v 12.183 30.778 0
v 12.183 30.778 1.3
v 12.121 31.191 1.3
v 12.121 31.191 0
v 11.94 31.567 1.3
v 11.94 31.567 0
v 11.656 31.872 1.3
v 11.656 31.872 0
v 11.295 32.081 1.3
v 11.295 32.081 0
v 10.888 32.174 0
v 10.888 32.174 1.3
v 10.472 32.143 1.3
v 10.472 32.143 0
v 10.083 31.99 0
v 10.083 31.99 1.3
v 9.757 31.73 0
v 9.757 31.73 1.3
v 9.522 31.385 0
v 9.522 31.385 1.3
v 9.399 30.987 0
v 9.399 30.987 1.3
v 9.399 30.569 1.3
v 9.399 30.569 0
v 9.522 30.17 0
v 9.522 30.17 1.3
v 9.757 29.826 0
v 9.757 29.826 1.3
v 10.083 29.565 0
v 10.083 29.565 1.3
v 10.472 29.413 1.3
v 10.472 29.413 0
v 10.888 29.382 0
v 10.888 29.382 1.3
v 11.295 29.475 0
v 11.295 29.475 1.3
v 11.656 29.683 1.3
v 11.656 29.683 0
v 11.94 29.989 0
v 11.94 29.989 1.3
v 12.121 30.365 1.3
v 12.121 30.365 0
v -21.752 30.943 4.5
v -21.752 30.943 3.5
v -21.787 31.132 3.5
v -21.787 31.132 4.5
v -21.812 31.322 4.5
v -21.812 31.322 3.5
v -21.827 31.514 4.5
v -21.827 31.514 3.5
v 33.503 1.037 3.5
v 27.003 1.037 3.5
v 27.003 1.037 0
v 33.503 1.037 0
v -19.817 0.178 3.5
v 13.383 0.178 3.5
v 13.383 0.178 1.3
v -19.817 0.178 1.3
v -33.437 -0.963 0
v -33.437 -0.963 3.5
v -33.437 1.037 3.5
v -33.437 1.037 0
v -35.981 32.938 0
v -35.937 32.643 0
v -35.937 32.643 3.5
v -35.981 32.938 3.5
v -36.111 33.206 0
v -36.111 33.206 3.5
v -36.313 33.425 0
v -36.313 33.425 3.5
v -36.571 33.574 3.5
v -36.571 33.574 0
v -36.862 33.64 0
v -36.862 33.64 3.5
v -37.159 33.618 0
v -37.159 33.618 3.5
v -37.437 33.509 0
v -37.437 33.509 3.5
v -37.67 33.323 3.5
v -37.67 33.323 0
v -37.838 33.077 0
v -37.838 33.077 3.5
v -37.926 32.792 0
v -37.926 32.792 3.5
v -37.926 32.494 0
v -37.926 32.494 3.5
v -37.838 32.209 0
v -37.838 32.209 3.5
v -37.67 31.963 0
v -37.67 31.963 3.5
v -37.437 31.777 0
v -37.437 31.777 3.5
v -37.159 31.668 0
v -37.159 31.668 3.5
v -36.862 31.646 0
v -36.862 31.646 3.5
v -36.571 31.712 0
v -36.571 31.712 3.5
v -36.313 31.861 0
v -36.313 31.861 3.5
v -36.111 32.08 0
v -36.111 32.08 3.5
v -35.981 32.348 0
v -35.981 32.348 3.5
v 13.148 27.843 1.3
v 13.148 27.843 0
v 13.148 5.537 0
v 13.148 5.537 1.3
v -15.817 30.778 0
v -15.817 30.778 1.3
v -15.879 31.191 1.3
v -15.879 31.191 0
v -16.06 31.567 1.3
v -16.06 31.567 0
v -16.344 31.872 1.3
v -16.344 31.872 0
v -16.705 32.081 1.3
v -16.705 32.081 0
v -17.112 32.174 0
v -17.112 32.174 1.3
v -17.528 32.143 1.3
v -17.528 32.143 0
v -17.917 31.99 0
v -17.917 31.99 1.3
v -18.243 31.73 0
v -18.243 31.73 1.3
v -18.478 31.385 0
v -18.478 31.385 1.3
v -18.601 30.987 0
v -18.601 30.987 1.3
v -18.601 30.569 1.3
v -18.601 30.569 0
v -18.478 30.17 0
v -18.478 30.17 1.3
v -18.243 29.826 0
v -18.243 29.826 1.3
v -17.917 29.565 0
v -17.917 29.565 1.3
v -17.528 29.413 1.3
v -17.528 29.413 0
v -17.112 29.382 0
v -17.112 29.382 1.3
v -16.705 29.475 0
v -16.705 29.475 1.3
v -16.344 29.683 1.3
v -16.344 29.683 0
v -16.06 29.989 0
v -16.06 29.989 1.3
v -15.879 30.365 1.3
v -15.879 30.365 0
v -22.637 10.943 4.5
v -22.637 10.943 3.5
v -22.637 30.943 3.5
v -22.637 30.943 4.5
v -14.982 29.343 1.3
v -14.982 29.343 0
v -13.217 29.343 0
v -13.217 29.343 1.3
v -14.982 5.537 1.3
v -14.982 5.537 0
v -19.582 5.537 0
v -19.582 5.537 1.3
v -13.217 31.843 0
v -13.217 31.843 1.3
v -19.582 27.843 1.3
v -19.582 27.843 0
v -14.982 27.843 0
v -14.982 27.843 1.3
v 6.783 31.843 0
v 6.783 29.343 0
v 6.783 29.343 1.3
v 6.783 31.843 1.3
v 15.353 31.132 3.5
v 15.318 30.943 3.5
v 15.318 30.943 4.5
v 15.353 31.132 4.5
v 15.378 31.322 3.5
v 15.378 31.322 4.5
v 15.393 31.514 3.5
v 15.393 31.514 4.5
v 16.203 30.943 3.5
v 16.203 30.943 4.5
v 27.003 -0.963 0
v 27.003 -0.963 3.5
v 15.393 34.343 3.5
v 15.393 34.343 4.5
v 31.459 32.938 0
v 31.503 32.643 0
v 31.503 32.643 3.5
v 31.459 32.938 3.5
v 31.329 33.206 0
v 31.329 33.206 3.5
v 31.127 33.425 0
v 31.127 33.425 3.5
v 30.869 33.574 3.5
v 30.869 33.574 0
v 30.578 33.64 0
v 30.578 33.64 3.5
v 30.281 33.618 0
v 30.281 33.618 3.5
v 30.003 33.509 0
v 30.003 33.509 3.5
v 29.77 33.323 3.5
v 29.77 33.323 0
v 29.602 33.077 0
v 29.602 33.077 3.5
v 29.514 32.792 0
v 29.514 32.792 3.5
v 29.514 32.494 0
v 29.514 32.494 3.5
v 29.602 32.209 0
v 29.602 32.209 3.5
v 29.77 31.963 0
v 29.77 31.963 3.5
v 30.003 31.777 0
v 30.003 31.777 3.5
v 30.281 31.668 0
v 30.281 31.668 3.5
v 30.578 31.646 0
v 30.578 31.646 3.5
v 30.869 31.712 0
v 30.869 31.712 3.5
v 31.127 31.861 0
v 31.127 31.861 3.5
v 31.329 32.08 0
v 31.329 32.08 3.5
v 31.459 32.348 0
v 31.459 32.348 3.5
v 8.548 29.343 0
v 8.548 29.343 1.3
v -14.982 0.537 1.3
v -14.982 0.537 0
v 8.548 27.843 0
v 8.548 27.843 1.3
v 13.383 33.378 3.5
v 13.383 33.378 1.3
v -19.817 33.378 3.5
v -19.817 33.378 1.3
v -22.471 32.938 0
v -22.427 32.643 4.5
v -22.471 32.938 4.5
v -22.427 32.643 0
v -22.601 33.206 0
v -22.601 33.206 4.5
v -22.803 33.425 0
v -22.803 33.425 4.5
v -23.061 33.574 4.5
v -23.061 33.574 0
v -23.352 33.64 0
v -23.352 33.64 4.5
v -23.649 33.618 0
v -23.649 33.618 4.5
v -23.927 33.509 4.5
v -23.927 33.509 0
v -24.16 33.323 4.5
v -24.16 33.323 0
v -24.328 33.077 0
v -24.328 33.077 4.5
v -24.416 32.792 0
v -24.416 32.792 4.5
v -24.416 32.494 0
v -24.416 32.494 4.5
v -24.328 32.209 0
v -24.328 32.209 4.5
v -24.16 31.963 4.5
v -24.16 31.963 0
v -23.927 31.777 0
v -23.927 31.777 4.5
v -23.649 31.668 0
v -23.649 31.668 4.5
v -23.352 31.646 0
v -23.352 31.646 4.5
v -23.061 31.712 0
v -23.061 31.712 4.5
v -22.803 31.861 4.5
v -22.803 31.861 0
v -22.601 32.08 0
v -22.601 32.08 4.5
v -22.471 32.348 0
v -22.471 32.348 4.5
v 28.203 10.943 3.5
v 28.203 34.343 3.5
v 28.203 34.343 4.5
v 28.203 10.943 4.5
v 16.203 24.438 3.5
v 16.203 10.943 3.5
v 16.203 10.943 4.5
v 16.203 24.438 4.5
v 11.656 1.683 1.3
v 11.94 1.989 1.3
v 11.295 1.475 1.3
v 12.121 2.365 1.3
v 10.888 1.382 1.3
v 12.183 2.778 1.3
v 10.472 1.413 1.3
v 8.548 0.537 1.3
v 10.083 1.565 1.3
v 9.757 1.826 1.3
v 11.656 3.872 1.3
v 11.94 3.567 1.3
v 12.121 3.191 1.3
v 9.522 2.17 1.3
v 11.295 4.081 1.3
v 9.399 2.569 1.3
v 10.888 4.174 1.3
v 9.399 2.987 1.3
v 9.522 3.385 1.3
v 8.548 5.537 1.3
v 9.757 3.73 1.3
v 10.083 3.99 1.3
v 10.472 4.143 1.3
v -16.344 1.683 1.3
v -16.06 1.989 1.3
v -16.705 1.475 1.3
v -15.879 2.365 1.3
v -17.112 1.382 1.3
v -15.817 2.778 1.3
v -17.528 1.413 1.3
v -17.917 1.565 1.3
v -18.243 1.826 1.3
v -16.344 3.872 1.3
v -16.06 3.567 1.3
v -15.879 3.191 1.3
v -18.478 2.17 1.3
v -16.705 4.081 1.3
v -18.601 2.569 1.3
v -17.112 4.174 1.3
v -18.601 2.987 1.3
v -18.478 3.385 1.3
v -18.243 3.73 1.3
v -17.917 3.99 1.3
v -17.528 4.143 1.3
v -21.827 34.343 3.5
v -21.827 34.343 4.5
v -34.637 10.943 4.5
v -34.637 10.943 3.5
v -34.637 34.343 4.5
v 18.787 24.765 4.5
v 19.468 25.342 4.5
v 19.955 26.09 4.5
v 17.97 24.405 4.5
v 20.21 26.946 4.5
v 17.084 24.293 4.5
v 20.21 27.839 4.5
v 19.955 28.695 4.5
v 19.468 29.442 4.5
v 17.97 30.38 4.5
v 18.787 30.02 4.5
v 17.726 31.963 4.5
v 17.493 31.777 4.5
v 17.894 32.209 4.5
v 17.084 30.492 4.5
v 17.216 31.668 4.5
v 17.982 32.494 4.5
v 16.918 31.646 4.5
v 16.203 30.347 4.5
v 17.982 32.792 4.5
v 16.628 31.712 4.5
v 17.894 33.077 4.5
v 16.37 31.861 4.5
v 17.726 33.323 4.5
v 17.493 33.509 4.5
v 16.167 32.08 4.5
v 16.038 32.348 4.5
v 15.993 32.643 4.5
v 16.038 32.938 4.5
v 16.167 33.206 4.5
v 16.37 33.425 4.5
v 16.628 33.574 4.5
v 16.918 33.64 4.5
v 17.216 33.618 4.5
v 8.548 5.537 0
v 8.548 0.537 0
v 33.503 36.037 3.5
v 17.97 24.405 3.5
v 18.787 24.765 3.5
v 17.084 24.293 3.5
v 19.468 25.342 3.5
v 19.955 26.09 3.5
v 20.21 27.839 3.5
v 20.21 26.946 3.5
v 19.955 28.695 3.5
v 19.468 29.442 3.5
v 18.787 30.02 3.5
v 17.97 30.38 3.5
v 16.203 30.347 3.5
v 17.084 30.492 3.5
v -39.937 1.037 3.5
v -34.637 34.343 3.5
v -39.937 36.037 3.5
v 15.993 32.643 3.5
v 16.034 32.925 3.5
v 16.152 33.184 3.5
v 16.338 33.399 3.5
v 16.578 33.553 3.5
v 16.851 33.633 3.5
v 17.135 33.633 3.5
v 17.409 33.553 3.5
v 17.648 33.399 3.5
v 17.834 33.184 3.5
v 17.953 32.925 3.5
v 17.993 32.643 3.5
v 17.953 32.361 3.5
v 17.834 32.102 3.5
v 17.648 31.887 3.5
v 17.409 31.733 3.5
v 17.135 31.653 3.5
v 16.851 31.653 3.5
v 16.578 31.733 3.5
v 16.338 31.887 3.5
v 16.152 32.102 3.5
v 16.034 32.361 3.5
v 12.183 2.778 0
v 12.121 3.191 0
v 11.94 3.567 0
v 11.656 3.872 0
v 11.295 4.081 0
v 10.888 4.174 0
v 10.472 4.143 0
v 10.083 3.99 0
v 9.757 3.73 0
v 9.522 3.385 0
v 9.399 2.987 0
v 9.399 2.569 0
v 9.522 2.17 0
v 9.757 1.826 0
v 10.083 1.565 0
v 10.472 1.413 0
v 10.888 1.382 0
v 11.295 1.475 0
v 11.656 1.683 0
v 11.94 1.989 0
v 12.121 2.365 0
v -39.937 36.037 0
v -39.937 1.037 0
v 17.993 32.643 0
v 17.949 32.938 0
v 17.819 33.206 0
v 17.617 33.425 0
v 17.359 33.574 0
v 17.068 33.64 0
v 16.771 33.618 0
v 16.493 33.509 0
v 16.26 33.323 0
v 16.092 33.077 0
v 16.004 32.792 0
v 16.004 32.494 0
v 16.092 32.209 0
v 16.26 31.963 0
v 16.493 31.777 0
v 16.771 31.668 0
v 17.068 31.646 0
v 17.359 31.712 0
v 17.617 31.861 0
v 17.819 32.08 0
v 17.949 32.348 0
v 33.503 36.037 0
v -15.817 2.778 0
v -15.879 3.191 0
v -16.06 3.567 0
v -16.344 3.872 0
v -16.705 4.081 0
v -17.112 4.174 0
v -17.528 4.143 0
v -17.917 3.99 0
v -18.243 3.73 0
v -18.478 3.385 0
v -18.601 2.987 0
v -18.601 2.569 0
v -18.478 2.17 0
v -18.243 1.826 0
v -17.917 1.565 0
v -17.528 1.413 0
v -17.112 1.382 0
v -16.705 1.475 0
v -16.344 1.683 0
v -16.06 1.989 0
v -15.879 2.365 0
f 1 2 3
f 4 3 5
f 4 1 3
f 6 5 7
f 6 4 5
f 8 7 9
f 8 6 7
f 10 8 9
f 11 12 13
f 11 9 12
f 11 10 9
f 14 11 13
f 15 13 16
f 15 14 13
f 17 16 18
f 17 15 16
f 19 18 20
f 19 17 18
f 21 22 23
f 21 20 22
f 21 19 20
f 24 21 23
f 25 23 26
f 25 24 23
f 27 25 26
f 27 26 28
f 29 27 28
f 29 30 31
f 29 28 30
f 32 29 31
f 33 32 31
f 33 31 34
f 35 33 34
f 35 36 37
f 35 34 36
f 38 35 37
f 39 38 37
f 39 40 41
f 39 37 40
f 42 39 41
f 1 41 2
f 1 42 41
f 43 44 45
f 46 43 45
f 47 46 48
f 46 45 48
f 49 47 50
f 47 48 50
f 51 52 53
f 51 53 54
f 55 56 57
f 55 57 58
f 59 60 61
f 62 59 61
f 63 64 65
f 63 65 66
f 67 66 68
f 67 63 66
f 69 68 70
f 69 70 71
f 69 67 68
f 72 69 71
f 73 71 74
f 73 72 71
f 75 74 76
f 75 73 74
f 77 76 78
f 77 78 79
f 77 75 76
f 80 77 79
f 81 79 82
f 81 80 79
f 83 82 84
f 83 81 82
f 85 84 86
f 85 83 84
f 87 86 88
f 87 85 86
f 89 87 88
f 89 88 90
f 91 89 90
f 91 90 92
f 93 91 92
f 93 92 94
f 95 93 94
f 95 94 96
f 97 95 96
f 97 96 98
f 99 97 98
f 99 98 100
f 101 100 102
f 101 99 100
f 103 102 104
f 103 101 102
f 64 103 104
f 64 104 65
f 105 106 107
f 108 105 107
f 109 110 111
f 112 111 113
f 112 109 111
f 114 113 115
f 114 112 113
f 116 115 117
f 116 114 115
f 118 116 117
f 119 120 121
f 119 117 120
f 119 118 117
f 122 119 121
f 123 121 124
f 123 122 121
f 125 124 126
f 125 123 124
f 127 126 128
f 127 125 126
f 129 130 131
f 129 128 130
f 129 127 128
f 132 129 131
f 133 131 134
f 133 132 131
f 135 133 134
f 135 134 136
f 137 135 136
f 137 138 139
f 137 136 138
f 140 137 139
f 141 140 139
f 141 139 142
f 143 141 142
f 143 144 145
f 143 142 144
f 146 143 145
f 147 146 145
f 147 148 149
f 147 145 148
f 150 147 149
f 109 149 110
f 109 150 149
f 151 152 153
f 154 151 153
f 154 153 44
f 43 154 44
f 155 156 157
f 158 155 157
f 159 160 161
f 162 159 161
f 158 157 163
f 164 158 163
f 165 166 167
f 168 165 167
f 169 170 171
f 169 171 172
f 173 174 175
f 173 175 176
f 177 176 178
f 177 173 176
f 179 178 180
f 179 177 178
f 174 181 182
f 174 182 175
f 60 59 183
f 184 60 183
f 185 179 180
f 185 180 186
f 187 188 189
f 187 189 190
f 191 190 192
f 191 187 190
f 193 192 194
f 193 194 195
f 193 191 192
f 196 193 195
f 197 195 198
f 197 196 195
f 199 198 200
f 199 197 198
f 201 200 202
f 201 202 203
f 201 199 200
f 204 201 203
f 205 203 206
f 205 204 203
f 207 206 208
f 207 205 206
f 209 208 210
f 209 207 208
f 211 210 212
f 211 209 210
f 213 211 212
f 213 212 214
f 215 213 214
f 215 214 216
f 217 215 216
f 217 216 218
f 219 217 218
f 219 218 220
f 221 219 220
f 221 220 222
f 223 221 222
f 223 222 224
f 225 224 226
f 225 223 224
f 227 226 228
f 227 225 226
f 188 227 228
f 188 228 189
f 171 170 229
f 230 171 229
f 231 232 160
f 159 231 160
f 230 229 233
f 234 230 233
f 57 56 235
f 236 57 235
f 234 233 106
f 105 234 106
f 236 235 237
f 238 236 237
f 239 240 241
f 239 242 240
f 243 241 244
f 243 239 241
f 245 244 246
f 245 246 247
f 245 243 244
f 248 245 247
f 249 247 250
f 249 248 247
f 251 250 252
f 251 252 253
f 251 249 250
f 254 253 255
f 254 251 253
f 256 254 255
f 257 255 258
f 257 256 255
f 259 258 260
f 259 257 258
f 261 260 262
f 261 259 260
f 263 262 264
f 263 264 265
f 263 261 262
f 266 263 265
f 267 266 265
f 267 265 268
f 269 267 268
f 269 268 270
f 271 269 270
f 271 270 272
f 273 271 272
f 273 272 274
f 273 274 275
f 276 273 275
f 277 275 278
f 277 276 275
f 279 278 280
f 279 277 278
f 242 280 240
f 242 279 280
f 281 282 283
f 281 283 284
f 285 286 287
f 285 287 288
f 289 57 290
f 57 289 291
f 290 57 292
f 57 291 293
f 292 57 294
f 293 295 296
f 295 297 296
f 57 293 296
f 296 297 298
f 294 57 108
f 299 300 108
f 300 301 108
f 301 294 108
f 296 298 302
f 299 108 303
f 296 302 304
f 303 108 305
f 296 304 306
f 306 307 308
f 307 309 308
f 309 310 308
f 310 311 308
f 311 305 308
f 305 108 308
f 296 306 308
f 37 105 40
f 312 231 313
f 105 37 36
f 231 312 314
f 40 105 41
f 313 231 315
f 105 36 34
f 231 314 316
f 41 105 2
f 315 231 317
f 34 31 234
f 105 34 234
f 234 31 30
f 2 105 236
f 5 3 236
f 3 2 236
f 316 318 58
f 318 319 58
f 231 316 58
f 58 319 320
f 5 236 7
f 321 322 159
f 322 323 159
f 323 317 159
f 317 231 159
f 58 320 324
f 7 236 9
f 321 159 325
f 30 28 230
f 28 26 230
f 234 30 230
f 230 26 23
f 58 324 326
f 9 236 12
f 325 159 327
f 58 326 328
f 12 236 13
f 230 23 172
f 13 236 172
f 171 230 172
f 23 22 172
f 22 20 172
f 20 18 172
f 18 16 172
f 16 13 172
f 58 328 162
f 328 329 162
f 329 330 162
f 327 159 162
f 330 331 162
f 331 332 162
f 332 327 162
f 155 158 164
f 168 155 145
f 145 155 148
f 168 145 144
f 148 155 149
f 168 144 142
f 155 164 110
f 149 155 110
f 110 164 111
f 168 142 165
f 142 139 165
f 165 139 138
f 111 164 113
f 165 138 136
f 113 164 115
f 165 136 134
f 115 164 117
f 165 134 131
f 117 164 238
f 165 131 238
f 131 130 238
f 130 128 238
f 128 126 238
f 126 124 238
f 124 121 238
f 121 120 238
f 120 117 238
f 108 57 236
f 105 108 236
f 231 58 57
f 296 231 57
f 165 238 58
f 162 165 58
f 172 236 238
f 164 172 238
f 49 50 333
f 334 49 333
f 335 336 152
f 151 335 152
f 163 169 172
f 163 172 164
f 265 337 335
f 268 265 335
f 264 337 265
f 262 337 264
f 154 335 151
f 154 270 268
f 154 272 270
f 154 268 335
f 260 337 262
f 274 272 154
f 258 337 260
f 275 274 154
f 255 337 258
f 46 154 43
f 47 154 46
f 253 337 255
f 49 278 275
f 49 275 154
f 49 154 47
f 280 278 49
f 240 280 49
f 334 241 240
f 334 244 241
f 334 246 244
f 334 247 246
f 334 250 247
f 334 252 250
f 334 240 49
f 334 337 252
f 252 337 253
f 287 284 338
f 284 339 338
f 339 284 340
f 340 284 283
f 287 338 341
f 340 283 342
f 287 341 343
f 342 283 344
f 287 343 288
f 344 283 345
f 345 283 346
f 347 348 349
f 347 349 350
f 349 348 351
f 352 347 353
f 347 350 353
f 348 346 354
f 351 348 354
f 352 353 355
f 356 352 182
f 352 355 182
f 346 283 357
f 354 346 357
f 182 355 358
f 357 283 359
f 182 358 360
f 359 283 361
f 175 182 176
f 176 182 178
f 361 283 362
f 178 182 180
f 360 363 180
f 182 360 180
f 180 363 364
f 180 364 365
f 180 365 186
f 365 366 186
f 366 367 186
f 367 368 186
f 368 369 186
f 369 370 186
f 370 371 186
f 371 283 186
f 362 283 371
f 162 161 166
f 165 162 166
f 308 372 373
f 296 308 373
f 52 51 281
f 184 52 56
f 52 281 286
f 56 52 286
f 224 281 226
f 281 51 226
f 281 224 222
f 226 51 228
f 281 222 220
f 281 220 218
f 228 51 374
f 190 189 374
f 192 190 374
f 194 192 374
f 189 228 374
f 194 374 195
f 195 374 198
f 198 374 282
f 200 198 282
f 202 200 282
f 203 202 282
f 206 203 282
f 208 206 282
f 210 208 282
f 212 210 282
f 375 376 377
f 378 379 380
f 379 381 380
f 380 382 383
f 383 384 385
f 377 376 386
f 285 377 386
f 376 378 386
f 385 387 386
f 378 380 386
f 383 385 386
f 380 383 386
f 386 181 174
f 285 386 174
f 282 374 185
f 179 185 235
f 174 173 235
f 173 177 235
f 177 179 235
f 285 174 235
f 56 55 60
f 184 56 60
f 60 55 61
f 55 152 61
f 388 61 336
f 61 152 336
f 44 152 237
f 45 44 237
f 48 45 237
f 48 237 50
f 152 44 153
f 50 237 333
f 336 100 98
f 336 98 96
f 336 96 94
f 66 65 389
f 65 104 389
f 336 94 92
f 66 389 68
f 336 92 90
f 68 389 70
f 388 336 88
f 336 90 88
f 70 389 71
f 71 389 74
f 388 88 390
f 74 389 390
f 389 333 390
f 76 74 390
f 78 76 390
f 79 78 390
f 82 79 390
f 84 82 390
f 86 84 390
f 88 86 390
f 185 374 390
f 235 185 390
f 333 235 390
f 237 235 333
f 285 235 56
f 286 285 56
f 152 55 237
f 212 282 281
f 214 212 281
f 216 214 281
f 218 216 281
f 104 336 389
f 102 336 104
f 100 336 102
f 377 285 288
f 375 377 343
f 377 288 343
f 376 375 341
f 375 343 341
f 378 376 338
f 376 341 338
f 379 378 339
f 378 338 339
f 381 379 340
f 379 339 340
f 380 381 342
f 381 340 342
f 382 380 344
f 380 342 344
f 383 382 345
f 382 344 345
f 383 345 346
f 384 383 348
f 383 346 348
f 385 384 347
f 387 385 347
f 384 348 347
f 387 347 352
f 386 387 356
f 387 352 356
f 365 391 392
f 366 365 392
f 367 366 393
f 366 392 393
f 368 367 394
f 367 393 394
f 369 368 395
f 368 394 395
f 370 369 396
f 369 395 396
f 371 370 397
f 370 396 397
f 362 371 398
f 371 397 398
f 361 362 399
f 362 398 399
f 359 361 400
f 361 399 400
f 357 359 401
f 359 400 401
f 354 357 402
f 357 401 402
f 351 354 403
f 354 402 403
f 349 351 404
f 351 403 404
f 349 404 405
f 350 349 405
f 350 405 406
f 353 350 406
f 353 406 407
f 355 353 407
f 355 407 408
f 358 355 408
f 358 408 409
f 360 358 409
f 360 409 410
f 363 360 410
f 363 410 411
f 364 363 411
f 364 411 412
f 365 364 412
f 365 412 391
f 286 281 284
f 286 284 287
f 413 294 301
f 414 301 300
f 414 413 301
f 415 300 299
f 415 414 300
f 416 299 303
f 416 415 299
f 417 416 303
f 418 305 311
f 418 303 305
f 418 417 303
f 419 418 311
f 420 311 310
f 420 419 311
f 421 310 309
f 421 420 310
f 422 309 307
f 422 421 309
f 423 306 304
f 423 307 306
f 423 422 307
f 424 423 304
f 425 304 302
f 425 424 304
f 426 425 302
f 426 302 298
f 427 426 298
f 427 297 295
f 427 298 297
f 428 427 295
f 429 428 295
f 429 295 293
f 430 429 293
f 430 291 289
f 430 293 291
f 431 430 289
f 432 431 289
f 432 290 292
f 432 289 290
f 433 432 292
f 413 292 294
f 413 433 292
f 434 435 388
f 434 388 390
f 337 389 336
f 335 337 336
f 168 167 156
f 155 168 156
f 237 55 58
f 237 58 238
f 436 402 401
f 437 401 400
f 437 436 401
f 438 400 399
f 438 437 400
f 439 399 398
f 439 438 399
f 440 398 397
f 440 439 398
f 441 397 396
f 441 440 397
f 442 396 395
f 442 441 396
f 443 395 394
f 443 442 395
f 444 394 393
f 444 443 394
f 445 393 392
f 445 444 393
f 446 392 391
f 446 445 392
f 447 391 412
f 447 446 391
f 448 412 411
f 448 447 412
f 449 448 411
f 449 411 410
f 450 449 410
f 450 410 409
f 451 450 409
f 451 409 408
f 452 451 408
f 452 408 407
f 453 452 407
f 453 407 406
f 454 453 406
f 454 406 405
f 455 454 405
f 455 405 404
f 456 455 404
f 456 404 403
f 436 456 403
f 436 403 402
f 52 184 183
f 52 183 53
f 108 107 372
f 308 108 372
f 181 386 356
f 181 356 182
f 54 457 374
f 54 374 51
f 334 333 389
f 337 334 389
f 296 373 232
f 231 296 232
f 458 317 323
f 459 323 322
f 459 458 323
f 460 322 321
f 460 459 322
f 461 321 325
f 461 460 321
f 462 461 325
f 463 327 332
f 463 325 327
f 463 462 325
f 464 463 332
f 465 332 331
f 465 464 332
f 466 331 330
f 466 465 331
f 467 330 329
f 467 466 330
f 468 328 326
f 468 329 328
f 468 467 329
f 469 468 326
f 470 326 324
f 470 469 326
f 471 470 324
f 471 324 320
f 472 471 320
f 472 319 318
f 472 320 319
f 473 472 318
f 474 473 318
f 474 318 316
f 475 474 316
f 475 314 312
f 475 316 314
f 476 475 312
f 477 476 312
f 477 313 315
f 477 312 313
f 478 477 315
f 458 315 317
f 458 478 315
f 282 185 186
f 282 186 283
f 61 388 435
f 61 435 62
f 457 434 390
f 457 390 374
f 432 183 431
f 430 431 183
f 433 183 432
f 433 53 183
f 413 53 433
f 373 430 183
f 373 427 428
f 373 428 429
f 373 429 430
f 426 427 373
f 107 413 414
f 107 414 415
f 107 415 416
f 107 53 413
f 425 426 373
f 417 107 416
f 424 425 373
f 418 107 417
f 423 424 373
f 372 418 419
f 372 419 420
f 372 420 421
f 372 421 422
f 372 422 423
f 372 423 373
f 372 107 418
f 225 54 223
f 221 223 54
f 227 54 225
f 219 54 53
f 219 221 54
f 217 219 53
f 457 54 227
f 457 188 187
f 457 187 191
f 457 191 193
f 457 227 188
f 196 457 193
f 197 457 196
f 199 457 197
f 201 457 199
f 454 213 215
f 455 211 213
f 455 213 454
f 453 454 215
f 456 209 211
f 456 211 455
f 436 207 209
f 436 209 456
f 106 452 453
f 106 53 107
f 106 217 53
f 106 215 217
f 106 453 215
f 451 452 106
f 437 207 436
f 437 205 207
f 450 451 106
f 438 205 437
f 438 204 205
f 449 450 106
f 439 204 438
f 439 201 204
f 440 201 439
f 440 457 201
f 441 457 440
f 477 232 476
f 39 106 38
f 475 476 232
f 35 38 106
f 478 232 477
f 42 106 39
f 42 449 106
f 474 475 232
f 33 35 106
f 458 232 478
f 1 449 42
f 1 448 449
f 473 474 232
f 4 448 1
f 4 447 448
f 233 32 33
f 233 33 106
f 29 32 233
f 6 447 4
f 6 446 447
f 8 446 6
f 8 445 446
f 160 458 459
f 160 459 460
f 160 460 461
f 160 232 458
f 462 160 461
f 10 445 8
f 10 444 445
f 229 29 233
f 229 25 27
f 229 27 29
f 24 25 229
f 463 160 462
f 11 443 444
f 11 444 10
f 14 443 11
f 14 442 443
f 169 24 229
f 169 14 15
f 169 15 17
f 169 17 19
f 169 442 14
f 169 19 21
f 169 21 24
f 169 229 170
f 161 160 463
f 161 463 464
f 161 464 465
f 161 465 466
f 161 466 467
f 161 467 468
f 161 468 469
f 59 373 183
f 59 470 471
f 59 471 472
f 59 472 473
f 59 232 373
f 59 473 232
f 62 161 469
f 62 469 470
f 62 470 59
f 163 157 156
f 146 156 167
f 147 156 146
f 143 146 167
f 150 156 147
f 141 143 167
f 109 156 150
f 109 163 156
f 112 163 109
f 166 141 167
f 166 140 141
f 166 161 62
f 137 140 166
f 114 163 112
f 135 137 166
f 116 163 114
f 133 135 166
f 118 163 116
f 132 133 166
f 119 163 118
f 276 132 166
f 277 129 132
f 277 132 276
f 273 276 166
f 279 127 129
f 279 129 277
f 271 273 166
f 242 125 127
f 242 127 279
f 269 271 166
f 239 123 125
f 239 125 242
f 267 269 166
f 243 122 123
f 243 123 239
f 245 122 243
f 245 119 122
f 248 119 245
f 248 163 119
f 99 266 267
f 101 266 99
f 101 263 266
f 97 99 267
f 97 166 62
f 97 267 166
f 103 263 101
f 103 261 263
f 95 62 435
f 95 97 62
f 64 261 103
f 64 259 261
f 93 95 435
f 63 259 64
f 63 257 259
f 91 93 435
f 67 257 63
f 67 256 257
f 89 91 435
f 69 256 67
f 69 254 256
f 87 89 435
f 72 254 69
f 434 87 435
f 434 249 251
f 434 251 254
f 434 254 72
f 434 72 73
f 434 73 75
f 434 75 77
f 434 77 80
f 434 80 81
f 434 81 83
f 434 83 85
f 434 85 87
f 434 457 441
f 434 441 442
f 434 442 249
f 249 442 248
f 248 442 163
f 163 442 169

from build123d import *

# Parameters (mm, degrees)
SKETCH3_R           = 1.4
SKETCH3_R_2         = 1
BOSS_EXTRUDE1_DEPTH = 3.5
SKETCH9_W           = 33.2
SKETCH9_H           = 33.2
CUT_EXTRUDE1_DEPTH  = 2.2
SKETCH10_W          = 20
SKETCH10_H          = 2.5
CUT_EXTRUDE2_DEPTH  = 1.75
SKETCH11_R          = 1
BOSS_EXTRUDE2_DEPTH = 1
SKETCH14_R          = 3.1
CUT_EXTRUDE3_DEPTH  = 1
SKETCH15_W          = 6.5
SKETCH15_H          = 2
CUT_EXTRUDE4_DEPTH  = 54.906325173


with BuildPart() as part:
    # Sketch3 → Boss-Extrude1 (new body)
    with BuildSketch(Plane.XY):
        Polygon((-39.936821352, -0.962627815), (-39.936821352, 36.037372185), (33.503178648, 36.037372185), (33.503178648, -0.962627815), (7.298178648, -0.962627815), (-14.831821352, -0.962627815), align=None)
        with Locations((-17.216821352, 30.777902568)):
            Circle(SKETCH3_R, mode=Mode.SUBTRACT)
        with Locations((-36.936821352, 32.642902568)):
            Circle(SKETCH3_R_2, mode=Mode.SUBTRACT)
        with Locations((-23.426821352, 32.642902568)):
            Circle(SKETCH3_R_2, mode=Mode.SUBTRACT)
        with Locations((16.993178648, 32.642902568)):
            Circle(SKETCH3_R_2, mode=Mode.SUBTRACT)
        with Locations((30.503178648, 32.642902568)):
            Circle(SKETCH3_R_2, mode=Mode.SUBTRACT)
        with Locations((-17.216821352, 2.777902568)):
            Circle(SKETCH3_R, mode=Mode.SUBTRACT)
        with Locations((10.783178648, 30.777902568)):
            Circle(SKETCH3_R, mode=Mode.SUBTRACT)
        with Locations((10.783178648, 2.777902568)):
            Circle(SKETCH3_R, mode=Mode.SUBTRACT)
        Polygon((-14.981821352, 0.537372185), (-14.981821352, 5.537372185), (-19.581821352, 5.537372185), (-19.581821352, 27.842902568), (-14.981821352, 27.842902568), (-14.981821352, 29.342902568), (8.548178648, 29.342902568), (8.548178648, 27.842902568), (13.148178648, 27.842902568), (13.148178648, 5.537372185), (8.548178648, 5.537372185), (8.548178648, 0.537372185), align=None, mode=Mode.SUBTRACT)
    extrude(amount=BOSS_EXTRUDE1_DEPTH)

    # Sketch9 → Cut-Extrude1 (cut)
    with BuildSketch(Plane(origin=(0, 0, 3.5), x_dir=(-1, 0, 0), z_dir=(0, 0, -1))):
        with Locations((3.216821352, 16.777902568)):
            Rectangle(SKETCH9_W, SKETCH9_H)
    extrude(amount=CUT_EXTRUDE1_DEPTH, mode=Mode.SUBTRACT)

    # Sketch10 → Cut-Extrude2 (cut)
    with BuildSketch(Plane(origin=(0, 0, 0), x_dir=(-1, 0, 0), z_dir=(0, 0, -1))):
        with Locations((3.216821352, 30.592902568)):
            Rectangle(SKETCH10_W, SKETCH10_H)
    extrude(amount=-CUT_EXTRUDE2_DEPTH, mode=Mode.SUBTRACT)

    # Sketch11 → Boss-Extrude2 (add)
    with BuildSketch(Plane.XY.offset(3.5)):
        with BuildLine():
            Line((-34.636821352, 30.942902568), (-34.636821352, 10.942902568))
            Line((-34.636821352, 10.942902568), (-22.636821352, 10.942902568))
            Line((-22.636821352, 10.942902568), (-22.636821352, 30.942902568))
            Line((-22.636821352, 30.942902568), (-21.751928528, 30.942902568))
            ThreePointArc((-21.751928528, 30.942902568), (-21.800520269, 31.226847518), (-21.826821352, 31.513717078))
            Line((-21.826821352, 31.513717078), (-21.826821352, 34.342902568))
            Line((-21.826821352, 34.342902568), (-34.636821352, 34.342902568))
            Line((-34.636821352, 34.342902568), (-34.636821352, 30.942902568))
        make_face()
        with Locations((-23.426821352, 32.642902568)):
            Circle(SKETCH11_R, mode=Mode.SUBTRACT)
    boss_extrude2 = extrude(amount=BOSS_EXTRUDE2_DEPTH)

    # Mirror1: Boss-Extrude2 across plane
    add(boss_extrude2.mirror(Plane.ZY.offset(3.216821352)))

    # Sketch14 → Cut-Extrude3 (cut)
    with BuildSketch(Plane.XY.offset(4.5)):
        with Locations((17.142214959, 27.392343087)):
            Circle(SKETCH14_R)
    extrude(amount=-CUT_EXTRUDE3_DEPTH, mode=Mode.SUBTRACT)

    # Sketch15 → Cut-Extrude4 (cut, through all)
    with BuildSketch(Plane.XY.offset(3.5)):
        with Locations((-36.686821352, 0.037372185)):
            Rectangle(SKETCH15_W, SKETCH15_H)
        with Locations((30.253178648, 0.037372185)):
            Rectangle(SKETCH15_W, SKETCH15_H)
    extrude(amount=-CUT_EXTRUDE4_DEPTH, mode=Mode.SUBTRACT)


solid = part.part
